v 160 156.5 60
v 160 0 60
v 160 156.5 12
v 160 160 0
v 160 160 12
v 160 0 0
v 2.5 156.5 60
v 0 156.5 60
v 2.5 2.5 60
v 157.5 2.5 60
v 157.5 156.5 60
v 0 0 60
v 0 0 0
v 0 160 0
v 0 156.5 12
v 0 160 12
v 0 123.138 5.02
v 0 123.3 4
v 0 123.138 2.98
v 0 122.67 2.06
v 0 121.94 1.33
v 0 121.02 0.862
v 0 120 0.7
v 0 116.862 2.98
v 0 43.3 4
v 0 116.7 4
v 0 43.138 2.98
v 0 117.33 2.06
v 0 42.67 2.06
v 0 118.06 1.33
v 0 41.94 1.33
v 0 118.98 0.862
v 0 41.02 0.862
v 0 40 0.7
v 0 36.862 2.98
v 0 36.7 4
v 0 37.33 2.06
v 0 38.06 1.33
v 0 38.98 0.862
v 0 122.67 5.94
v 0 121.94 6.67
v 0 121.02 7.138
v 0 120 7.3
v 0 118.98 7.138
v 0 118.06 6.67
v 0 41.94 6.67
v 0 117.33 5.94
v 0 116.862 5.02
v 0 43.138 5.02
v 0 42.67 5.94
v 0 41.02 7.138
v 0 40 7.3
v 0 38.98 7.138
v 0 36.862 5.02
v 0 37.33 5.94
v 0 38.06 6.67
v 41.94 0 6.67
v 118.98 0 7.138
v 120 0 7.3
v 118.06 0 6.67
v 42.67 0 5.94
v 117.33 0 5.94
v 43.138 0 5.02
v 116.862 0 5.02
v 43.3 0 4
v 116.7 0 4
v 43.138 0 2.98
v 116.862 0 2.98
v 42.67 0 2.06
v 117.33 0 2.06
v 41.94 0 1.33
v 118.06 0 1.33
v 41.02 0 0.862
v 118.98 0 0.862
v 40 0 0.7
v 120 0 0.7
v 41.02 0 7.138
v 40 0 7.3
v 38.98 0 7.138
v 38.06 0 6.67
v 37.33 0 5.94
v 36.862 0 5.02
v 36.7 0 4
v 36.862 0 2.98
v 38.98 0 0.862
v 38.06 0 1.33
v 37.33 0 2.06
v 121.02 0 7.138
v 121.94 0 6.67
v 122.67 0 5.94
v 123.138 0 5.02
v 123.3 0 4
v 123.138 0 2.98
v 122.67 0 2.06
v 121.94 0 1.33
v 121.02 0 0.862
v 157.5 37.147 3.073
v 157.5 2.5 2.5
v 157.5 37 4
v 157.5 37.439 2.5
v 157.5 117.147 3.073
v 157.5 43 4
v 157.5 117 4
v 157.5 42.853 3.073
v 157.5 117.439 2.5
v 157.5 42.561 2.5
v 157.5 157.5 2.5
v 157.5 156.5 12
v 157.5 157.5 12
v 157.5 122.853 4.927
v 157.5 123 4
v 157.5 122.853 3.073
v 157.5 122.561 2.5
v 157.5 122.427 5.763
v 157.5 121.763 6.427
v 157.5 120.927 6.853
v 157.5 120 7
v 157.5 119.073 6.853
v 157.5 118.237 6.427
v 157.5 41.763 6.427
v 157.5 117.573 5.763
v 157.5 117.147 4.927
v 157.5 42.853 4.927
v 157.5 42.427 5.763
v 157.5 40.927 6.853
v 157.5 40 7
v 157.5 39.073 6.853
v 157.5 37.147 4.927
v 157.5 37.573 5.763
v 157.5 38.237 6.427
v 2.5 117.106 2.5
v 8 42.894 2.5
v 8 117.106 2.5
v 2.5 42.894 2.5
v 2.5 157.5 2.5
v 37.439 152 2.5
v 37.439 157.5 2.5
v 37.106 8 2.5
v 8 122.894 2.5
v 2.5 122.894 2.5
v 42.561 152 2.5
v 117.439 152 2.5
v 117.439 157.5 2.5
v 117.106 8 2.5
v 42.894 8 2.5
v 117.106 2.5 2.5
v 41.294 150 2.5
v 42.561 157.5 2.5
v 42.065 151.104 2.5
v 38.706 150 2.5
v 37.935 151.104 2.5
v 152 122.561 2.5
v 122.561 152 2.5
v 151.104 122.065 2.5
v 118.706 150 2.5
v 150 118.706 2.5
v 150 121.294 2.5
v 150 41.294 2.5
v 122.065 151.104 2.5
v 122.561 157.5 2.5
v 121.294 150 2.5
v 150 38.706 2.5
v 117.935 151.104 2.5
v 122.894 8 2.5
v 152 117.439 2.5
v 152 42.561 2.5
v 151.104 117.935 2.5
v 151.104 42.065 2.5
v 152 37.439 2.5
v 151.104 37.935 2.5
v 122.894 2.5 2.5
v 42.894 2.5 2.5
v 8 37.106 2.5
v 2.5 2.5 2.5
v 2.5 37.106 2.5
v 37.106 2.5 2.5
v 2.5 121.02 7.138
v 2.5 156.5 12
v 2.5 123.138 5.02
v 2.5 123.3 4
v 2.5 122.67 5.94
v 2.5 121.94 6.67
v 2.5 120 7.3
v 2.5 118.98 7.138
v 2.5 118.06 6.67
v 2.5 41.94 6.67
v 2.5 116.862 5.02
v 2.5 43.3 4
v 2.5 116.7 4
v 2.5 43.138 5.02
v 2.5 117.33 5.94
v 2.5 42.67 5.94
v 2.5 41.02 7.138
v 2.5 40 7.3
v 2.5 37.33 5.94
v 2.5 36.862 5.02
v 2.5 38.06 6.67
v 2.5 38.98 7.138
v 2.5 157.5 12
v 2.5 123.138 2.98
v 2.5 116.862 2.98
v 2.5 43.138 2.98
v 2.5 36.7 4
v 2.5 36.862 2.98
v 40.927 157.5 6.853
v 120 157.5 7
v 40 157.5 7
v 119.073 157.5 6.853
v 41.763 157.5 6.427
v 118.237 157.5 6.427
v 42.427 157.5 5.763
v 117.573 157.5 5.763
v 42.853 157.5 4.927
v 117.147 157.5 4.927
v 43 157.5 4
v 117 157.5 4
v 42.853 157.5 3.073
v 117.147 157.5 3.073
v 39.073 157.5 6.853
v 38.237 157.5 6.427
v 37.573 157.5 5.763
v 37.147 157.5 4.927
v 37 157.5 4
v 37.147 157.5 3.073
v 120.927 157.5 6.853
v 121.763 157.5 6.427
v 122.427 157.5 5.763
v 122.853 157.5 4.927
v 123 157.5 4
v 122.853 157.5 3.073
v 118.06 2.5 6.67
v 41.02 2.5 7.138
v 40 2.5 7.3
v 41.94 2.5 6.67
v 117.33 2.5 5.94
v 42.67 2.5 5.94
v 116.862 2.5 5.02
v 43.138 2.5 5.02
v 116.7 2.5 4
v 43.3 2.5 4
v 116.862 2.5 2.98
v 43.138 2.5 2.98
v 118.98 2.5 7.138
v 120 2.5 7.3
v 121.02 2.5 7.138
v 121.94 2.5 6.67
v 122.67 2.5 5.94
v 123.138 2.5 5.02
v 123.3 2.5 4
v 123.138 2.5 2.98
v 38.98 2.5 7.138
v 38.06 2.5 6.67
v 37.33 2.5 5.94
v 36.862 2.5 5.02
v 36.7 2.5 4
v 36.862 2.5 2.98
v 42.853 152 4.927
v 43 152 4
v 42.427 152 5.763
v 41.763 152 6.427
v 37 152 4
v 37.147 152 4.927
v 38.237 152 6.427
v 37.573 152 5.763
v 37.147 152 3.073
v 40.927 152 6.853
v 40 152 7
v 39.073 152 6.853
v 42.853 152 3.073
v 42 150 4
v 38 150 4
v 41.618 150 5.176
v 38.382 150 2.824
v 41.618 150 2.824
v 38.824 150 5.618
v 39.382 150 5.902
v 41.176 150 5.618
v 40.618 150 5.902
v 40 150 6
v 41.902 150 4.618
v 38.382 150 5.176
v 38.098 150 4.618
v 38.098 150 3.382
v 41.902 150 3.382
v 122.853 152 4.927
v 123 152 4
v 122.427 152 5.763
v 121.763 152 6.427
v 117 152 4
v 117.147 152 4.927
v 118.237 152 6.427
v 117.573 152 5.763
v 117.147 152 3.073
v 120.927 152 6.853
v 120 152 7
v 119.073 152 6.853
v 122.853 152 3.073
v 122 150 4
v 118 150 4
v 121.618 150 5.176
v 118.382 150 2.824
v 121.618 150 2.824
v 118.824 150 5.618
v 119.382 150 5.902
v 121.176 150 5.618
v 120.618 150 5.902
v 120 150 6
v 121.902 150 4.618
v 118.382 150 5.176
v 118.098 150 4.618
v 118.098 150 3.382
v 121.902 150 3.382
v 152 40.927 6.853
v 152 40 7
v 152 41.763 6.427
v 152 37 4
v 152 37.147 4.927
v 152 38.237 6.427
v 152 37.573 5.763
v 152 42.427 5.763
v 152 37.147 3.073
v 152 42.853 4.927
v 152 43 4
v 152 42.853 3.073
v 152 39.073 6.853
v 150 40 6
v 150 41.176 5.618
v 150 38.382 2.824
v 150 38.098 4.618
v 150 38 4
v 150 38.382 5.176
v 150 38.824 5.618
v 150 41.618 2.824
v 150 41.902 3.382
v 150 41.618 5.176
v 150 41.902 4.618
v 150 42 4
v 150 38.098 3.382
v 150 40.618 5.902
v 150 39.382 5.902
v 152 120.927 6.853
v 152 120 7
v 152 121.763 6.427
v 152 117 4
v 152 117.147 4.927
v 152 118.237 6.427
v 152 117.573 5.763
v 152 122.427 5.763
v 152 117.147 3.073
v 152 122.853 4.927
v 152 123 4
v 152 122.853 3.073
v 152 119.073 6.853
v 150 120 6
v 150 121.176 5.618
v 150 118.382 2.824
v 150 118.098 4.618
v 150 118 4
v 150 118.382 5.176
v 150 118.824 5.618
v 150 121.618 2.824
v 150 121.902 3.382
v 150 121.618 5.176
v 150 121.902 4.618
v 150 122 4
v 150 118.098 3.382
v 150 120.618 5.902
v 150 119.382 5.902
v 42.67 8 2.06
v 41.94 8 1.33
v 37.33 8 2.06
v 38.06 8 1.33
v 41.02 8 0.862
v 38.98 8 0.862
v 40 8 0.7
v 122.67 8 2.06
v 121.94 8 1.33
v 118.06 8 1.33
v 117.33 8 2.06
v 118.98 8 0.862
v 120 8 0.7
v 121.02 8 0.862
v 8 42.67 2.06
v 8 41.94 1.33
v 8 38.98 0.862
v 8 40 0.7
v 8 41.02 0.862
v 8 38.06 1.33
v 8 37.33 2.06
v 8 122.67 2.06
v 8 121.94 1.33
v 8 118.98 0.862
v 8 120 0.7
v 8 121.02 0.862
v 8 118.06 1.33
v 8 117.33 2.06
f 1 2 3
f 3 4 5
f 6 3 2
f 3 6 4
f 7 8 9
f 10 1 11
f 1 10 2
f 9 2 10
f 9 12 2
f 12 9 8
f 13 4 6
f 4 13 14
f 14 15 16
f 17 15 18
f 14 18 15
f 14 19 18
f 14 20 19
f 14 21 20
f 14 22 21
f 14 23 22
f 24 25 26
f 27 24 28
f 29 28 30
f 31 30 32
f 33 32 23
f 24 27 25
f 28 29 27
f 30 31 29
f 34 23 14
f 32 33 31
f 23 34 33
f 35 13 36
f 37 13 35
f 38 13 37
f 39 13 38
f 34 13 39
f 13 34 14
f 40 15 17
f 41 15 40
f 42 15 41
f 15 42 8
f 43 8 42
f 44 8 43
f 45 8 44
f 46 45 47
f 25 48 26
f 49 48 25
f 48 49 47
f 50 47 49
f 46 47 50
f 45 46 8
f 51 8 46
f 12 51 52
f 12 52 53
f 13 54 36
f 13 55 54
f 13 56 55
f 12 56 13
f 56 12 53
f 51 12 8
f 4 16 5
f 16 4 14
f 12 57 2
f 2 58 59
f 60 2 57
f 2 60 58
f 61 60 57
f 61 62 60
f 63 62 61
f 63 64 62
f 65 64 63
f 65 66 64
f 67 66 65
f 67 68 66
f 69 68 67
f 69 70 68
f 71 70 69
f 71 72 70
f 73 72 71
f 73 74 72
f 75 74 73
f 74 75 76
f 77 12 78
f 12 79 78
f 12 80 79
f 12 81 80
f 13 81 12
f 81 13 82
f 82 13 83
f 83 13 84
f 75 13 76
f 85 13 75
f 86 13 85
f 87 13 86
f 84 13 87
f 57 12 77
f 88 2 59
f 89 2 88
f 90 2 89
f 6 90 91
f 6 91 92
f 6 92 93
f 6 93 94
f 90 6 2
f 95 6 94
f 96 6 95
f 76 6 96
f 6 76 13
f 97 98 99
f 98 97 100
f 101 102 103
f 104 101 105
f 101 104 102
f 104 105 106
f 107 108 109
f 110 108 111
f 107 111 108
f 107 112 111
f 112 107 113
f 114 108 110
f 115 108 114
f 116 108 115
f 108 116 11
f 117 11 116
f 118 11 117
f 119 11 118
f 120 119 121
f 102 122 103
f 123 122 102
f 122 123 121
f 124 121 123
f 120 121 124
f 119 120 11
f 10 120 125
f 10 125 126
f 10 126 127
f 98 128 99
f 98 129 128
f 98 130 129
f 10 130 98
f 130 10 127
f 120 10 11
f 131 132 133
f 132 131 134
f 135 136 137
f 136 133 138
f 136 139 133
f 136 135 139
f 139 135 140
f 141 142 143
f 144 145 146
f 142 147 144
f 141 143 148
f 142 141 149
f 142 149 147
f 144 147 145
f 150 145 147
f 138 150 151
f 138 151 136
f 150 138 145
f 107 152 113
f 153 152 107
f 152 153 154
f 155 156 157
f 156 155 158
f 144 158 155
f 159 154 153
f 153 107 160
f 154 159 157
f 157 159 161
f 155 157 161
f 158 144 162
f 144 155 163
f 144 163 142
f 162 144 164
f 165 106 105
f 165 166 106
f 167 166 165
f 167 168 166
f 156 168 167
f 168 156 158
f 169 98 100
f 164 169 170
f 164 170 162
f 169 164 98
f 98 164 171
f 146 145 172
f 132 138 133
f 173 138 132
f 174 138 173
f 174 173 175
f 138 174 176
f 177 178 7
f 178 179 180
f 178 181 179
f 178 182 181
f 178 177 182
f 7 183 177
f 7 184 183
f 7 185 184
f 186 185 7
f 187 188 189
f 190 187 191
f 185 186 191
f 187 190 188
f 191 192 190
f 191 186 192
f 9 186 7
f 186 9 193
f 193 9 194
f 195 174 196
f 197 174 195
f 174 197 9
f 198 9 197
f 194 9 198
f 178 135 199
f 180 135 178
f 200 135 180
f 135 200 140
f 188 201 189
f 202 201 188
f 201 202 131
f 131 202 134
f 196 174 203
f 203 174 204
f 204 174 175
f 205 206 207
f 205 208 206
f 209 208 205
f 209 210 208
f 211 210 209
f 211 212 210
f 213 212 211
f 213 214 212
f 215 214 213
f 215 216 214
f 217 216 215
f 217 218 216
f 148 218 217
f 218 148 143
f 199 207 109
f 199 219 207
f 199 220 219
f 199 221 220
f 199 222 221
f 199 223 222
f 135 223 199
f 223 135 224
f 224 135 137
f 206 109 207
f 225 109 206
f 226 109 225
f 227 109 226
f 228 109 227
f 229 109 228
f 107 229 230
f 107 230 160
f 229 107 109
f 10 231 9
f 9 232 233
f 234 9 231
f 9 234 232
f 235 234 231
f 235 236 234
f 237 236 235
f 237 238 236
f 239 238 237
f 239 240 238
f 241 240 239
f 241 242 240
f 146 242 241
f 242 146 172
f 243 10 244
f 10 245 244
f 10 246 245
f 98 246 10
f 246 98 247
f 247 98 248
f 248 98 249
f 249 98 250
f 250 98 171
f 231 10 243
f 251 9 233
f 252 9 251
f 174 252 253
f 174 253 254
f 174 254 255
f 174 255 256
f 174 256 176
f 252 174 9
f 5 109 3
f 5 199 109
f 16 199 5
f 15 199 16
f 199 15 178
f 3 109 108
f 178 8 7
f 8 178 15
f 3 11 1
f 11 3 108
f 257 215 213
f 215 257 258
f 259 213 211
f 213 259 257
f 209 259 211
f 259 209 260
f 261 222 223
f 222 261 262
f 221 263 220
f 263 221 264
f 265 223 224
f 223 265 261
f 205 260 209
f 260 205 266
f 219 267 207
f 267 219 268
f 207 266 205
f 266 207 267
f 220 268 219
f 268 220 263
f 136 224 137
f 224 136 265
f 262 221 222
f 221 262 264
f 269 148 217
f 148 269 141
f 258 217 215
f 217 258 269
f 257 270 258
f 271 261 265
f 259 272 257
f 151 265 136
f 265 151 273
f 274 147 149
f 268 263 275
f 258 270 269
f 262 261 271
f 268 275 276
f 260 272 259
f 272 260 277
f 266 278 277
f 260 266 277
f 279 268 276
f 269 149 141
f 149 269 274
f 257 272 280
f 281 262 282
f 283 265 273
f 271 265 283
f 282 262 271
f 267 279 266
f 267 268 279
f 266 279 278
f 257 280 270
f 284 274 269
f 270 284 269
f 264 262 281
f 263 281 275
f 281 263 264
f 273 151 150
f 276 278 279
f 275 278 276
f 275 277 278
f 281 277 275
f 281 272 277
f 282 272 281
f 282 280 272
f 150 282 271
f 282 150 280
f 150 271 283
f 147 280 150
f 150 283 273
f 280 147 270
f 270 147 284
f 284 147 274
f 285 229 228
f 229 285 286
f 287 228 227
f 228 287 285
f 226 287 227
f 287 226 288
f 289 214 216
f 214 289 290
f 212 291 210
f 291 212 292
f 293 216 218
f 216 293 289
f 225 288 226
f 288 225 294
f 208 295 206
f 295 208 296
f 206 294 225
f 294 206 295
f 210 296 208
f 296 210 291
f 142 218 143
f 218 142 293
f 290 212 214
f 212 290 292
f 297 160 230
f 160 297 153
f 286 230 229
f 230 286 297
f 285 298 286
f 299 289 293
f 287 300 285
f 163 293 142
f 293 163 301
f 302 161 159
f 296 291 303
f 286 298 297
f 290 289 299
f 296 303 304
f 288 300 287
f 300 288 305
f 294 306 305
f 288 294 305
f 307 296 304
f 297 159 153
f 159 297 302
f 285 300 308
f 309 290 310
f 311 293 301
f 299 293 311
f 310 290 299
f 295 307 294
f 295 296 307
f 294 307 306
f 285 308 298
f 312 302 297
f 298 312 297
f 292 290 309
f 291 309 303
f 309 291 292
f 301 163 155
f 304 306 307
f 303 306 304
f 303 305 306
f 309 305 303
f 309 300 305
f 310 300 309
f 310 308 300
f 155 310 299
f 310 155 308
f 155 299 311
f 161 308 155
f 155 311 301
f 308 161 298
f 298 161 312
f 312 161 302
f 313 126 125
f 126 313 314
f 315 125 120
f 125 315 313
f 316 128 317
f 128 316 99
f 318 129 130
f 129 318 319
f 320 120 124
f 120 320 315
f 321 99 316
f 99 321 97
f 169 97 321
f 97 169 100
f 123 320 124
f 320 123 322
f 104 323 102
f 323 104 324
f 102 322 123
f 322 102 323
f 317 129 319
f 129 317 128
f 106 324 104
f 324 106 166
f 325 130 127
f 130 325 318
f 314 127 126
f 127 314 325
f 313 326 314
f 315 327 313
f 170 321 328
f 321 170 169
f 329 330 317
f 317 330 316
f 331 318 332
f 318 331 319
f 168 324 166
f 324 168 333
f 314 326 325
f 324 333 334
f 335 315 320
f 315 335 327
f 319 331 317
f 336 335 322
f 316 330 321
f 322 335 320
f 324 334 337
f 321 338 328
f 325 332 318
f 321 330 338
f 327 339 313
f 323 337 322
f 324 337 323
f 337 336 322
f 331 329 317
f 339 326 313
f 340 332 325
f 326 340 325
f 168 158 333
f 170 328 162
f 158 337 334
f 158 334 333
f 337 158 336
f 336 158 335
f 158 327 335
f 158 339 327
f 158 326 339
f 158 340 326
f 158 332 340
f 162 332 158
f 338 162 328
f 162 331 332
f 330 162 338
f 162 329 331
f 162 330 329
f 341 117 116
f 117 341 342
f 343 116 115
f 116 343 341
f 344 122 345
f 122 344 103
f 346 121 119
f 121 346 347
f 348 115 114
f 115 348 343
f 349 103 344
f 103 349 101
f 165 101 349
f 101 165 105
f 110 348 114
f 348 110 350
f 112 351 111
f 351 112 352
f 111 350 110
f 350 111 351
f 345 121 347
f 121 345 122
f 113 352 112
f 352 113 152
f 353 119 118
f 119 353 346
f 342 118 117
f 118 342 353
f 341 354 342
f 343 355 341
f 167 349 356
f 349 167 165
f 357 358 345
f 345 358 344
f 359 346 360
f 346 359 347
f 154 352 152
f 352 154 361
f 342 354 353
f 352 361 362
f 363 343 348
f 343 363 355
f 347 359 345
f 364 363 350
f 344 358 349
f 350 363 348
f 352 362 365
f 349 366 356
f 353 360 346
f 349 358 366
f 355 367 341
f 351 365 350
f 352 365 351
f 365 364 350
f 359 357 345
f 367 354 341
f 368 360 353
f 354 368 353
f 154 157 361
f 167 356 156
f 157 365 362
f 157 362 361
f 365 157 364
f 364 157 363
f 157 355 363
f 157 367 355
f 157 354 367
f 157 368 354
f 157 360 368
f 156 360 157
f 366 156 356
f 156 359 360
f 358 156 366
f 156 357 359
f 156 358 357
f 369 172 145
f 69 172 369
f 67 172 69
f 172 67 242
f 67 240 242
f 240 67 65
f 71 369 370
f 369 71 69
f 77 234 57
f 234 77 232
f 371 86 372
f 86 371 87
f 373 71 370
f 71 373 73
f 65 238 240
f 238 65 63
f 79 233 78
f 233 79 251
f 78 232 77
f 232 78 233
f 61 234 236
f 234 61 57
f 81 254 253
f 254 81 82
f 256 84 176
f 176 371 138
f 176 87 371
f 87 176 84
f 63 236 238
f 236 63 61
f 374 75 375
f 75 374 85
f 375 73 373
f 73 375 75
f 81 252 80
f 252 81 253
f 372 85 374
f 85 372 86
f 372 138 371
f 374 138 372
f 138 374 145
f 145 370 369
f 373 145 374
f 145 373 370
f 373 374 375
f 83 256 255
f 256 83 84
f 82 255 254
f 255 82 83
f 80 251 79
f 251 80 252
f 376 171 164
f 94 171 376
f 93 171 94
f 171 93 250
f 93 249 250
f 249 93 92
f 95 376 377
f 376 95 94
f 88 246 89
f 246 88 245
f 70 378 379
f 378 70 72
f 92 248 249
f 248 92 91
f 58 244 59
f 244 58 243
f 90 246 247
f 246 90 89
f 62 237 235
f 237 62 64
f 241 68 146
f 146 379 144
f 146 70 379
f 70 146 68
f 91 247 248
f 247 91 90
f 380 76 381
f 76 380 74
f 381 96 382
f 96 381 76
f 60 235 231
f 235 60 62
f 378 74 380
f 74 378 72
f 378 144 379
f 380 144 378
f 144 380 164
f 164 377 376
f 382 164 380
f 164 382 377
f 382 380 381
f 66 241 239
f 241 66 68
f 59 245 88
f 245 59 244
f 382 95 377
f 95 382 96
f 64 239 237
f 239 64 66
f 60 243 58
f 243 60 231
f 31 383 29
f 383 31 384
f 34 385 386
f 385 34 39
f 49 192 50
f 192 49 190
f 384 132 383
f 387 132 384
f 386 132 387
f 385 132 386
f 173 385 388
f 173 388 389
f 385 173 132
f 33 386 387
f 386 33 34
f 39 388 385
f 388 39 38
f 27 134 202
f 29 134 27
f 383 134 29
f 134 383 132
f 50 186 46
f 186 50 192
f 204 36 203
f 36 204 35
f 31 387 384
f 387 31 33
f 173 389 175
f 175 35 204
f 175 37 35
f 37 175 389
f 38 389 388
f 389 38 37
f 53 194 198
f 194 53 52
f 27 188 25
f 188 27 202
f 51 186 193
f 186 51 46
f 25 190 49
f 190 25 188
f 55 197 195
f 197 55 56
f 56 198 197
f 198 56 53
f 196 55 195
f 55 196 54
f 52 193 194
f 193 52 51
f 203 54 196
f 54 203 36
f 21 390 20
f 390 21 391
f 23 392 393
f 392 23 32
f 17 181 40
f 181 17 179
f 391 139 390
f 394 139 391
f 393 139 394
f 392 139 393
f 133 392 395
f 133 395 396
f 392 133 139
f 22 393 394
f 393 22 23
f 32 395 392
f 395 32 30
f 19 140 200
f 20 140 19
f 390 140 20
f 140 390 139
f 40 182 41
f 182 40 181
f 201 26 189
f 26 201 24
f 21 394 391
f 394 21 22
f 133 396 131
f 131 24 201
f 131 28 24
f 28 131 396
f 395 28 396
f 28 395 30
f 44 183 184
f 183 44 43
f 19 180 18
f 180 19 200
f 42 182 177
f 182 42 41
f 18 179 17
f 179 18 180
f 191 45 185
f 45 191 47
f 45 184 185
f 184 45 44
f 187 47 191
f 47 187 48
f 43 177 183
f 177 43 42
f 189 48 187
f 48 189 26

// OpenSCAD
// Modular Desk Organizer System
// Snap-together tiles — mix sizes to build your layout
// Print: 0.2mm, 3 walls, 15% infill, no supports

// Tile variants: S (1x1), M (1x2), L (2x2)
TILE = "L";  // "S", "M", or "L"

UNIT   = 80;    // Base grid unit
HEIGHT = 60;
WALL_T = 2.5;
CLIP_H = 8;
CLIP_D = 6;
CLIP_PLAY = 0.3;

W = (TILE == "M" || TILE == "L") ? UNIT * 2 : UNIT;
D = (TILE == "L") ? UNIT * 2 : UNIT;

module clip_male() {
    cylinder(d = CLIP_D, h = CLIP_H, $fn = 20);
    translate([0, 0, CLIP_H])
        cylinder(d1 = CLIP_D, d2 = CLIP_D - 2, h = 2, $fn = 20);
}

module clip_female() {
    cylinder(d = CLIP_D + CLIP_PLAY * 2, h = CLIP_H + 1, $fn = 20);
}

module tile_base() {
    difference() {
        cube([W, D, HEIGHT]);
        // Hollow
        translate([WALL_T, WALL_T, WALL_T])
            cube([W - 2*WALL_T, D - 2*WALL_T, HEIGHT]);
        // Front opening (access)
        translate([-1, D - WALL_T - 1, HEIGHT * 0.2])
            cube([W + 2, WALL_T + 2, HEIGHT]);
    }
}

module connectors() {
    // Male clips on right and back edges
    for (x = [UNIT/2 : UNIT : W])
        translate([x, D, CLIP_H/2])
            rotate([90, 0, 0]) clip_male();
    for (y = [UNIT/2 : UNIT : D])
        translate([W, y, CLIP_H/2])
            rotate([0, -90, 0]) clip_male();

    // Female sockets on left and front
    difference() {
        cube([0,0,0]); // placeholder
        for (x = [UNIT/2 : UNIT : W])
            translate([x, 0, CLIP_H/2])
                rotate([-90, 0, 0]) clip_female();
        for (y = [UNIT/2 : UNIT : D])
            translate([0, y, CLIP_H/2])
                rotate([0, 90, 0]) clip_female();
    }
}

difference() {
    union() {
        tile_base();
        connectors();
    }
    // Female socket cutouts
    for (x = [UNIT/2 : UNIT : W])
        translate([x, -1, CLIP_H/2])
            rotate([-90, 0, 0]) clip_female();
    for (y = [UNIT/2 : UNIT : D])
        translate([-1, y, CLIP_H/2])
            rotate([0, 90, 0]) clip_female();
}
